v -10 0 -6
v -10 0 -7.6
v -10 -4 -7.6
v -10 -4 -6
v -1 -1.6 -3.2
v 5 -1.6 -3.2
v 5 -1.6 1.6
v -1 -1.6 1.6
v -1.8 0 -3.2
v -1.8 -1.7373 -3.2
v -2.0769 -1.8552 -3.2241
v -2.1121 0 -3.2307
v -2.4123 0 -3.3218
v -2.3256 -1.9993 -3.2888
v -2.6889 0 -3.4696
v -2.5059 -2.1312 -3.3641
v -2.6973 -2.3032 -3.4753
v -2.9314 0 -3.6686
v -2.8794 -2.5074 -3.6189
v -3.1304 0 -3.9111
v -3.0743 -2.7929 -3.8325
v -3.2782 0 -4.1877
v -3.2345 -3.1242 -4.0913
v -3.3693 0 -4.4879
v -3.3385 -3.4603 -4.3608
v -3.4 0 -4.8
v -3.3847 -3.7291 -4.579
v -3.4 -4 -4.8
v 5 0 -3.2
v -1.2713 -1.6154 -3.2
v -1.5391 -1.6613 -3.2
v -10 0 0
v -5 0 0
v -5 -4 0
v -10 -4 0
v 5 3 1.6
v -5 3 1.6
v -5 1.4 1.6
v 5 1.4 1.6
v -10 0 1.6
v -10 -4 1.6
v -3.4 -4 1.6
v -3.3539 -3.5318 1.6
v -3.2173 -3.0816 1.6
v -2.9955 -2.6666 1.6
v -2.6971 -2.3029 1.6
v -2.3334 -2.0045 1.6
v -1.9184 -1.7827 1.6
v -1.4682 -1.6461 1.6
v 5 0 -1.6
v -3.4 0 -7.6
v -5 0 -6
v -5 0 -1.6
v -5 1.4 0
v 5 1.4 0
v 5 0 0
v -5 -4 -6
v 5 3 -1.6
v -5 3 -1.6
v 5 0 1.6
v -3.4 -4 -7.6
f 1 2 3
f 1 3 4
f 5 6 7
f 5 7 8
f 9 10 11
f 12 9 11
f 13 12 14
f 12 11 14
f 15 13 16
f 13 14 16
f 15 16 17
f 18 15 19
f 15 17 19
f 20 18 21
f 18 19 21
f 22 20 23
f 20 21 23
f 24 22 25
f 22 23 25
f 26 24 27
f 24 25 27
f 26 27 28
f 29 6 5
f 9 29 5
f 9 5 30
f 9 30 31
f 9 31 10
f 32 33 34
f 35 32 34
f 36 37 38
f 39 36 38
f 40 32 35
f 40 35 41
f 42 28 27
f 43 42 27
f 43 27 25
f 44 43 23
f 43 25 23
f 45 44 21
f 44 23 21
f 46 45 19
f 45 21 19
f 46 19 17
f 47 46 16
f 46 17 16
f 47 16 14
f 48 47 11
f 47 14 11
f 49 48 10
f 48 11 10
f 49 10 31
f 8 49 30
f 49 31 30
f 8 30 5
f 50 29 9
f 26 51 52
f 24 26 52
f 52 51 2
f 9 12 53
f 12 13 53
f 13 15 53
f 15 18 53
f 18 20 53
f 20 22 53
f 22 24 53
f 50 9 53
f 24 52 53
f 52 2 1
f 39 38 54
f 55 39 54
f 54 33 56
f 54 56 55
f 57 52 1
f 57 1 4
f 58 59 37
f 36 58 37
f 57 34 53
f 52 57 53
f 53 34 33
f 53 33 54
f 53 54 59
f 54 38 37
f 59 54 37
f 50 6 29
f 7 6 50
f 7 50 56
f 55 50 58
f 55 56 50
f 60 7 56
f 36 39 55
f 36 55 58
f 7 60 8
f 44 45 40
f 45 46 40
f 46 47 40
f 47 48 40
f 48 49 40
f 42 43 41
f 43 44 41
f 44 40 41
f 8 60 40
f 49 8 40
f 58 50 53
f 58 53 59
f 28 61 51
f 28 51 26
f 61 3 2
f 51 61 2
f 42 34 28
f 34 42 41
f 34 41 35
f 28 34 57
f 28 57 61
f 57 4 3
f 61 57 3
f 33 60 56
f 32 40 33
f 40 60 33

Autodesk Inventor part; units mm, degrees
sketch "Sketch2" plane through (0, 0, 0) normal (1, 0, 0) x (0, 1, 0)
  line L0 (0, -7.6) -> (0, -1.6)
  line L1 (0, 3.44) -> (0, -9.44) projected
  line L2 (-5.4, 0) -> (4.4, 0) projected
  line L3 (0, -1.6) -> (3, -1.6)
  line L4 (3, -1.6) -> (3, 1.6)
  line L5 (3, 1.6) -> (1.4, 1.6)
  line L6 (1.4, 1.6) -> (1.4, 0)
  line L7 (1.4, 0) -> (0, 0)
  line L8 (0, 0) -> (0, 1.6)
  line L9 (0, 1.6) -> (-4, 1.6)
  line L10 (-4, 1.6) -> (-4, 1.6)
  line L11 (-4, 1.6) -> (-4, -7.6)
  line L12 (-4, -7.6) -> (0, -7.6)
  point P0 (0, 0)
  dimension "d1" = 6
  dimension "d2" = 3
  dimension "d3" = 3.2
  dimension "d4" = 1.6
  dimension "d6" = 4
  dimension "d7" = 1.6
  dimension "d8" = 1.4
  dimension "d12" = 1.6
extrude "Extrusion1" add sketch "Sketch2" along normal mid plane 10
sketch "Sketch3" plane through (0, 0, 0) normal (0, 0, 1) x (1, 0, 0)
  line L0 (5, 0) -> (5, 3) projected
  line L1 (5, 0) -> (5, -1.6)
  line L2 (5, -4) -> (5, 0) projected
  line L3 (-5, -4) -> (5, -4) projected
  line L4 (-3.4, -4) -> (-3.4, -4)
  line L5 (-5, 0) -> (-5, -4) projected
  line L6 (5, -1.6) -> (-1, -1.6)
  arc A0 (-1, -1.6) -> (-3.4, -4) centre (-1, -4) ccw
  point P0 (0, 0)
  point P1 (-3.4, -4)
  dimension "d14" = 1.6
  dimension "d15" = 1.6
  dimension "d17" = 2.4
extrude "Extrusion2" cut sketch "Sketch3" along normal through all both and the other way through all
sketch "Sketch4" plane through (-5, 0, 0) normal (-1, 0, 0) x (0, 0, 1)
  line L0 (1.6, 0) -> (0, 0) projected
  line L1 (-7.6, -4) -> (1.6, -4) projected
  line L2 (1.6, 0) -> (0, 0)
  line L3 (0, 0) -> (0, -4)
  line L4 (0, -4) -> (1.6, -4)
  line L5 (1.6, -4) -> (1.6, 0)
  line L6 (-1.6, 0) -> (-7.6, 0) projected
  line L7 (-7.6, 0) -> (-6, 0)
  line L8 (-6, 0) -> (-6, -4)
  line L9 (-6, -4) -> (-7.6, -4)
  line L10 (-7.6, -4) -> (-7.6, 0)
  point P0 (-7.6, -4)
  point P1 (-6, 0)
  point P2 (0, 0)
  dimension "d20" = 1.6
  dimension "d21" = 1.6
extrude "Extrusion3" add sketch "Sketch4" along normal blind 5
sketch "Sketch6" plane through (-5, 0, -1.6) normal (0, 1, 0) x (1, 0, 0)
  line L0 (-5, 6) -> (10, 6) projected
  line L1 (1.6, 6) -> (1.6, 3.2)
  line L2 (0, 0) -> (0, 4.4) projected
  line L3 (10, 6) -> (10, 0) projected
  line L4 (10, 1.6) -> (3.2, 1.6)
  line L5 (0, 0) -> (10, 0) projected
  arc A0 (1.6, 3.2) -> (3.2, 1.6) centre (3.2, 3.2) ccw
  point P0 (5, -1.6)
  point P1 (0, 6)
  dimension "d24" = 1.6
  dimension "d25" = 1.6
  dimension "d26" = 1.6
extrude "Extrusion4" cut sketch "Sketch6" along normal through all both and the other way through all
properties part number "Hanging_Wall"
